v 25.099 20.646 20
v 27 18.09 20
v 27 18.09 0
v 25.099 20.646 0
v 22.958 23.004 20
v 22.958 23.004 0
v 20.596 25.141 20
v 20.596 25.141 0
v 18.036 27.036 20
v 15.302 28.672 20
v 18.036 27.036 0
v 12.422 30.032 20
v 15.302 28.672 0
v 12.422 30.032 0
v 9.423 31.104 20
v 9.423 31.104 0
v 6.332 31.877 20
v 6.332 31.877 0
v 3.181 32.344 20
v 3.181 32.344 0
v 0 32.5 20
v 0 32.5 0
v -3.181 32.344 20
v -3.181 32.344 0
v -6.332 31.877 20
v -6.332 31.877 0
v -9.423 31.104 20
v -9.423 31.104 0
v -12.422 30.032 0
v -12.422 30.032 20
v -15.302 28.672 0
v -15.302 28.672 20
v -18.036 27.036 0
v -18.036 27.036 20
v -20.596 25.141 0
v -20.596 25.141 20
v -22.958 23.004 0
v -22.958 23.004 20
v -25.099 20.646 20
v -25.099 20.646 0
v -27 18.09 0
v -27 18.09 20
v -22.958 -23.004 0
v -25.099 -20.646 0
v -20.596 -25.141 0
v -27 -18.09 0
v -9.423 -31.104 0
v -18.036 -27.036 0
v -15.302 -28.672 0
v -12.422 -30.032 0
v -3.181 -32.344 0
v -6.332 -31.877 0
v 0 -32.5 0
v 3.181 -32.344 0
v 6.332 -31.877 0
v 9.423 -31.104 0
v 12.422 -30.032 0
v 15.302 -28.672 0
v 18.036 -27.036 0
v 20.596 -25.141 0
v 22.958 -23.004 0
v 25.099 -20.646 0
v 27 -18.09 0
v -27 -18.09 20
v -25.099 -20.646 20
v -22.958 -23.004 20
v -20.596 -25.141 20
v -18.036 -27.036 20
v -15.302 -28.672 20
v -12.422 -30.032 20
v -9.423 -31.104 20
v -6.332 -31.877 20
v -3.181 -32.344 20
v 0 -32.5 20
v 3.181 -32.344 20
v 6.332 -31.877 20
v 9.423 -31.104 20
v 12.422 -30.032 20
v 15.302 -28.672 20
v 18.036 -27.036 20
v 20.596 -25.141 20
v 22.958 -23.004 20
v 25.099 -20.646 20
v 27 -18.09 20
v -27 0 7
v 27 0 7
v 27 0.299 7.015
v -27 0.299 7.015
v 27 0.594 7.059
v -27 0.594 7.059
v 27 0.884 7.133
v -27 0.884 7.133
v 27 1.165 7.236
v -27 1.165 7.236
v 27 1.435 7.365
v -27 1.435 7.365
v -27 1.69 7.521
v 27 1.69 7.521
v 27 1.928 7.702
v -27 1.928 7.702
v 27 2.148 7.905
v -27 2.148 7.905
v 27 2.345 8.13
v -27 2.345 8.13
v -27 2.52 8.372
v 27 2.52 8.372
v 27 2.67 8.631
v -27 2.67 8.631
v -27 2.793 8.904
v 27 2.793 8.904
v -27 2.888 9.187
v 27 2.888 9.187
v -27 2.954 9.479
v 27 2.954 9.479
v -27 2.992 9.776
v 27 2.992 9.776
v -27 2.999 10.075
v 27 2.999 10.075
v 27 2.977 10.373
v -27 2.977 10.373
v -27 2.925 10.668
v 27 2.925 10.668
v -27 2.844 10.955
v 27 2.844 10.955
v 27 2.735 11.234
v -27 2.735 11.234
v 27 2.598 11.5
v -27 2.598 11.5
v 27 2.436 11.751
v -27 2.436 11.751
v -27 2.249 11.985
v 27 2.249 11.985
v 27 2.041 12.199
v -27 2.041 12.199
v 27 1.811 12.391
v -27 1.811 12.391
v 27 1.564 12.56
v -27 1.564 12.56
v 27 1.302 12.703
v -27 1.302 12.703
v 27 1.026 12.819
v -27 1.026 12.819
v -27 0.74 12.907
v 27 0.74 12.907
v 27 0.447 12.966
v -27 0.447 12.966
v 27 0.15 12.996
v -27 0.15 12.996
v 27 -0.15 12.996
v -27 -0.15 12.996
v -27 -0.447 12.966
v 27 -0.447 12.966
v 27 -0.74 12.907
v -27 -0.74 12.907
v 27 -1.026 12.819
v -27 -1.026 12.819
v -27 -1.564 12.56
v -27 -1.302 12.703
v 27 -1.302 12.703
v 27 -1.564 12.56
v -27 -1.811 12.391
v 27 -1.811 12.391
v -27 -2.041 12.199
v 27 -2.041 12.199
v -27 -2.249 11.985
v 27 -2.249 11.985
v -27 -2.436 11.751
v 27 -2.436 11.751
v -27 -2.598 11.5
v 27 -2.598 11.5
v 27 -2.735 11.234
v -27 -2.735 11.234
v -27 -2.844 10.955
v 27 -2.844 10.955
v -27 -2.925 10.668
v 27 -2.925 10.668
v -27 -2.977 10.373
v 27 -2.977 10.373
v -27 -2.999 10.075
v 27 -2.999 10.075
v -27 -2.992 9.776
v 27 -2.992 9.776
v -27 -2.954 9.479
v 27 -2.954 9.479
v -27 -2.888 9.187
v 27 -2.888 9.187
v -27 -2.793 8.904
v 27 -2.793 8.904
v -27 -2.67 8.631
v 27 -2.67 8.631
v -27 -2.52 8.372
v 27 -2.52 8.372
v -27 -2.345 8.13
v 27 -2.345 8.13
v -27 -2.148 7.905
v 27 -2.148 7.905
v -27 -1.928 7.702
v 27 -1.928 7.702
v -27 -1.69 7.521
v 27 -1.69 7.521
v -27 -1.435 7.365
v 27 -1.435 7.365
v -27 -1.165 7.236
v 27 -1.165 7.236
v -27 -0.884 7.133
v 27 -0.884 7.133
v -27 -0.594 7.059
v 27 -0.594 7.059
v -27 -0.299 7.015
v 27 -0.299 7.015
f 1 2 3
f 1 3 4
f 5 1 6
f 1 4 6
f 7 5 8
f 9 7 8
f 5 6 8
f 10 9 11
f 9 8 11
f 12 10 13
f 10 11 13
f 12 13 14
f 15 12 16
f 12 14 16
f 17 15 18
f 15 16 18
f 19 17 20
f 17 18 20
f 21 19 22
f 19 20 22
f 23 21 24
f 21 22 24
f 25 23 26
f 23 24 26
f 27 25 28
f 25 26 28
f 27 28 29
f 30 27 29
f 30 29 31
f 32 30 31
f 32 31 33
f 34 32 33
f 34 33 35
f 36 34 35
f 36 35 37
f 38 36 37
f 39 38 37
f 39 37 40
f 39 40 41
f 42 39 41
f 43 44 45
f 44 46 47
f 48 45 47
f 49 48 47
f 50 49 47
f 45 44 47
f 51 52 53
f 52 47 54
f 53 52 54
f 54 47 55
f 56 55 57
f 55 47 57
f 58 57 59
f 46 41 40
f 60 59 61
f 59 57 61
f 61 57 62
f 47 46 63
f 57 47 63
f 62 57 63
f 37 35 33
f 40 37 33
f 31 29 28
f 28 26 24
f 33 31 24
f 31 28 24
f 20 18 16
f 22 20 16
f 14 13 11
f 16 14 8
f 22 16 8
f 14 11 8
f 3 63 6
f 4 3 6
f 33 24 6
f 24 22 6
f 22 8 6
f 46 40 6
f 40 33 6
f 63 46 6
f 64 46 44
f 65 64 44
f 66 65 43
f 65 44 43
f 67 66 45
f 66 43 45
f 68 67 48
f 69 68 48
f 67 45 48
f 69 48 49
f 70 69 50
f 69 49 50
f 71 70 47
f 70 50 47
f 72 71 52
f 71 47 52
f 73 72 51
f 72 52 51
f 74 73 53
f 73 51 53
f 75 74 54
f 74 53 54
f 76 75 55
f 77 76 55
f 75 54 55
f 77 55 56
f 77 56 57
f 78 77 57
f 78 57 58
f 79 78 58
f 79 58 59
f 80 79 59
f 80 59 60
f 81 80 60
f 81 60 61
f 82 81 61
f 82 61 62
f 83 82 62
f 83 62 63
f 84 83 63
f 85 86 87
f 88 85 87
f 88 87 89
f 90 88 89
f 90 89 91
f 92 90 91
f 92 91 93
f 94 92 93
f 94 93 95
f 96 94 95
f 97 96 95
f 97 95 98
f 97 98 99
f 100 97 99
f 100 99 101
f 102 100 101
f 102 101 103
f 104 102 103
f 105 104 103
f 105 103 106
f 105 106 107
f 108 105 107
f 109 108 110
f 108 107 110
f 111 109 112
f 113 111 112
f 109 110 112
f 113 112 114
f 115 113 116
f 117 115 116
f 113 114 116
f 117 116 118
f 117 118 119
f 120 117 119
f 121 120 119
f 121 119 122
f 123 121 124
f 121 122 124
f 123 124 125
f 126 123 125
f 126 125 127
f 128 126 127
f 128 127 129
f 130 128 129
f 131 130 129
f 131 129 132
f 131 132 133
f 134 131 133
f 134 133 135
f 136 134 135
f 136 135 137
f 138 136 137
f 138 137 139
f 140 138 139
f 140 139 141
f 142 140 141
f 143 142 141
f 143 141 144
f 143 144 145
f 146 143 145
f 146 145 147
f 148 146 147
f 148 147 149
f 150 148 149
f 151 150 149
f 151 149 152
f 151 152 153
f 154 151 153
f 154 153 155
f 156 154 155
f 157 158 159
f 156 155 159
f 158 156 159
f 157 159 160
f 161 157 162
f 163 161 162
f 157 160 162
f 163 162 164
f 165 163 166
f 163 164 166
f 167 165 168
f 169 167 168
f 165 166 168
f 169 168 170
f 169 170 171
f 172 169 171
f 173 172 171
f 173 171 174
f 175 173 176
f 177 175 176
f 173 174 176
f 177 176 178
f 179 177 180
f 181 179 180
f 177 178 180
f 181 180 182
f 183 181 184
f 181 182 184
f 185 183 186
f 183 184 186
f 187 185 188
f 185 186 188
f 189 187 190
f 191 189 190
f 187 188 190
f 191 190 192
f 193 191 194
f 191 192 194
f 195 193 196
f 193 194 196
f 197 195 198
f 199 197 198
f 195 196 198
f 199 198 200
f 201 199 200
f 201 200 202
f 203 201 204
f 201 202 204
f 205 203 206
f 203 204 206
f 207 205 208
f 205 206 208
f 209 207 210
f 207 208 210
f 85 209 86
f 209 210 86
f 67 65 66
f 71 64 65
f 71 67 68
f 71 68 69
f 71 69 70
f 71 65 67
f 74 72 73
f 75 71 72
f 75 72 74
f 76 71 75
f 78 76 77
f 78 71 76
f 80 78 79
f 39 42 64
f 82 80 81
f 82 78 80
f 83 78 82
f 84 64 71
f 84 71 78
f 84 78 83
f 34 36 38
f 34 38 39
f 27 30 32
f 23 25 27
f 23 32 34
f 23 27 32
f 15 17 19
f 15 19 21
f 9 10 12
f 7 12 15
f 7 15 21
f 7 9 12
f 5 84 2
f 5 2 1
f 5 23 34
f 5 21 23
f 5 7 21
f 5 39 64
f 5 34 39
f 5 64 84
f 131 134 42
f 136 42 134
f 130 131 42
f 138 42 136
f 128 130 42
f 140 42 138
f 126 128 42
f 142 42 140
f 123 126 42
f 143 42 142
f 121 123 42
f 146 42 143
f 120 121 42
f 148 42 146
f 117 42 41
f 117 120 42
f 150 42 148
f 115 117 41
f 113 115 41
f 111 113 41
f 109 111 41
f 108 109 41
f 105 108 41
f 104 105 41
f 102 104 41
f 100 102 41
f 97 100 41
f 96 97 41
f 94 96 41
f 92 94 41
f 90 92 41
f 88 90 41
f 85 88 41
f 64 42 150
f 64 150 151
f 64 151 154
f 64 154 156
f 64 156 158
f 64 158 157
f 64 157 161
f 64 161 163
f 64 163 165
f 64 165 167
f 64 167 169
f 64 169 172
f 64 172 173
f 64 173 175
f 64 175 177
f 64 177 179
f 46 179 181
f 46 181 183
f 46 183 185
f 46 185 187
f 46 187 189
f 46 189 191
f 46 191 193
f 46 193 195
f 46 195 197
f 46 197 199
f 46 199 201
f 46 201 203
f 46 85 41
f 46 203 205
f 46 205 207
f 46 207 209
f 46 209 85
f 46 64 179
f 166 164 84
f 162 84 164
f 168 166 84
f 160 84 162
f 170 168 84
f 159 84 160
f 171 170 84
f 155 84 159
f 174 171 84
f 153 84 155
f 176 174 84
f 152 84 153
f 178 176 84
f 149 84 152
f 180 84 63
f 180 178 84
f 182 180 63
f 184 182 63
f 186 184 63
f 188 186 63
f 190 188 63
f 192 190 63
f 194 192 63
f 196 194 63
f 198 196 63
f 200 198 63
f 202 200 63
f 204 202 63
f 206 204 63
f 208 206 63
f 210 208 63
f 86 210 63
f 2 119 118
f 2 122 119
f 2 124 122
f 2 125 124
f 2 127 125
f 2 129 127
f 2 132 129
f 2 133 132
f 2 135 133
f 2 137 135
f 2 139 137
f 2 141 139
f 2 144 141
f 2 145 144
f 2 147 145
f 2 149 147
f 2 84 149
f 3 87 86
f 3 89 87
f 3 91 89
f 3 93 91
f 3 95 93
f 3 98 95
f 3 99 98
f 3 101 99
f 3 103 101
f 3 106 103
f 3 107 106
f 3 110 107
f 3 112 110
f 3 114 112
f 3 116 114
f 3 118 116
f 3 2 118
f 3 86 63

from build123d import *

# Parameters (mm, degrees)
SKETCH_3_R          = 32.5
EXTRUDE_3_DEPTH     = 20
SKETCH_4_W          = 17.889883514
SKETCH_4_H          = 45.147936345
SKETCH_4_W_2        = 17.954509811
CUT_EXTRUDE_1_DEPTH = 40
SKETCH_5_R          = 3
CUT_EXTRUDE_2_DEPTH = 60


with BuildPart() as part:
    # Эскиз3 → Вытянуть3 (new body)
    with BuildSketch(Plane.XY):
        Circle(SKETCH_3_R)
    extrude(amount=EXTRUDE_3_DEPTH)

    # Эскиз4 → Вырез-Вытянуть1 (cut, symmetric)
    with BuildSketch(Plane(origin=(0, 0, 0), x_dir=(1, 0, 0), z_dir=(0, 1, 0))):
        with Locations((-35.944941757, -4.95296847)):
            Rectangle(SKETCH_4_W, SKETCH_4_H)
        with Locations((35.977254906, -4.95296847)):
            Rectangle(SKETCH_4_W_2, SKETCH_4_H)
    extrude(amount=CUT_EXTRUDE_1_DEPTH, both=True, mode=Mode.SUBTRACT)

    # Эскиз5 → Вырез-Вытянуть2 (cut)
    with BuildSketch(Plane(origin=(27, 0, 0), x_dir=(0, 0, -1), z_dir=(1, 0, 0))):
        with Locations((-10, 0)):
            Circle(SKETCH_5_R)
    extrude(amount=-CUT_EXTRUDE_2_DEPTH, mode=Mode.SUBTRACT)


solid = part.part
